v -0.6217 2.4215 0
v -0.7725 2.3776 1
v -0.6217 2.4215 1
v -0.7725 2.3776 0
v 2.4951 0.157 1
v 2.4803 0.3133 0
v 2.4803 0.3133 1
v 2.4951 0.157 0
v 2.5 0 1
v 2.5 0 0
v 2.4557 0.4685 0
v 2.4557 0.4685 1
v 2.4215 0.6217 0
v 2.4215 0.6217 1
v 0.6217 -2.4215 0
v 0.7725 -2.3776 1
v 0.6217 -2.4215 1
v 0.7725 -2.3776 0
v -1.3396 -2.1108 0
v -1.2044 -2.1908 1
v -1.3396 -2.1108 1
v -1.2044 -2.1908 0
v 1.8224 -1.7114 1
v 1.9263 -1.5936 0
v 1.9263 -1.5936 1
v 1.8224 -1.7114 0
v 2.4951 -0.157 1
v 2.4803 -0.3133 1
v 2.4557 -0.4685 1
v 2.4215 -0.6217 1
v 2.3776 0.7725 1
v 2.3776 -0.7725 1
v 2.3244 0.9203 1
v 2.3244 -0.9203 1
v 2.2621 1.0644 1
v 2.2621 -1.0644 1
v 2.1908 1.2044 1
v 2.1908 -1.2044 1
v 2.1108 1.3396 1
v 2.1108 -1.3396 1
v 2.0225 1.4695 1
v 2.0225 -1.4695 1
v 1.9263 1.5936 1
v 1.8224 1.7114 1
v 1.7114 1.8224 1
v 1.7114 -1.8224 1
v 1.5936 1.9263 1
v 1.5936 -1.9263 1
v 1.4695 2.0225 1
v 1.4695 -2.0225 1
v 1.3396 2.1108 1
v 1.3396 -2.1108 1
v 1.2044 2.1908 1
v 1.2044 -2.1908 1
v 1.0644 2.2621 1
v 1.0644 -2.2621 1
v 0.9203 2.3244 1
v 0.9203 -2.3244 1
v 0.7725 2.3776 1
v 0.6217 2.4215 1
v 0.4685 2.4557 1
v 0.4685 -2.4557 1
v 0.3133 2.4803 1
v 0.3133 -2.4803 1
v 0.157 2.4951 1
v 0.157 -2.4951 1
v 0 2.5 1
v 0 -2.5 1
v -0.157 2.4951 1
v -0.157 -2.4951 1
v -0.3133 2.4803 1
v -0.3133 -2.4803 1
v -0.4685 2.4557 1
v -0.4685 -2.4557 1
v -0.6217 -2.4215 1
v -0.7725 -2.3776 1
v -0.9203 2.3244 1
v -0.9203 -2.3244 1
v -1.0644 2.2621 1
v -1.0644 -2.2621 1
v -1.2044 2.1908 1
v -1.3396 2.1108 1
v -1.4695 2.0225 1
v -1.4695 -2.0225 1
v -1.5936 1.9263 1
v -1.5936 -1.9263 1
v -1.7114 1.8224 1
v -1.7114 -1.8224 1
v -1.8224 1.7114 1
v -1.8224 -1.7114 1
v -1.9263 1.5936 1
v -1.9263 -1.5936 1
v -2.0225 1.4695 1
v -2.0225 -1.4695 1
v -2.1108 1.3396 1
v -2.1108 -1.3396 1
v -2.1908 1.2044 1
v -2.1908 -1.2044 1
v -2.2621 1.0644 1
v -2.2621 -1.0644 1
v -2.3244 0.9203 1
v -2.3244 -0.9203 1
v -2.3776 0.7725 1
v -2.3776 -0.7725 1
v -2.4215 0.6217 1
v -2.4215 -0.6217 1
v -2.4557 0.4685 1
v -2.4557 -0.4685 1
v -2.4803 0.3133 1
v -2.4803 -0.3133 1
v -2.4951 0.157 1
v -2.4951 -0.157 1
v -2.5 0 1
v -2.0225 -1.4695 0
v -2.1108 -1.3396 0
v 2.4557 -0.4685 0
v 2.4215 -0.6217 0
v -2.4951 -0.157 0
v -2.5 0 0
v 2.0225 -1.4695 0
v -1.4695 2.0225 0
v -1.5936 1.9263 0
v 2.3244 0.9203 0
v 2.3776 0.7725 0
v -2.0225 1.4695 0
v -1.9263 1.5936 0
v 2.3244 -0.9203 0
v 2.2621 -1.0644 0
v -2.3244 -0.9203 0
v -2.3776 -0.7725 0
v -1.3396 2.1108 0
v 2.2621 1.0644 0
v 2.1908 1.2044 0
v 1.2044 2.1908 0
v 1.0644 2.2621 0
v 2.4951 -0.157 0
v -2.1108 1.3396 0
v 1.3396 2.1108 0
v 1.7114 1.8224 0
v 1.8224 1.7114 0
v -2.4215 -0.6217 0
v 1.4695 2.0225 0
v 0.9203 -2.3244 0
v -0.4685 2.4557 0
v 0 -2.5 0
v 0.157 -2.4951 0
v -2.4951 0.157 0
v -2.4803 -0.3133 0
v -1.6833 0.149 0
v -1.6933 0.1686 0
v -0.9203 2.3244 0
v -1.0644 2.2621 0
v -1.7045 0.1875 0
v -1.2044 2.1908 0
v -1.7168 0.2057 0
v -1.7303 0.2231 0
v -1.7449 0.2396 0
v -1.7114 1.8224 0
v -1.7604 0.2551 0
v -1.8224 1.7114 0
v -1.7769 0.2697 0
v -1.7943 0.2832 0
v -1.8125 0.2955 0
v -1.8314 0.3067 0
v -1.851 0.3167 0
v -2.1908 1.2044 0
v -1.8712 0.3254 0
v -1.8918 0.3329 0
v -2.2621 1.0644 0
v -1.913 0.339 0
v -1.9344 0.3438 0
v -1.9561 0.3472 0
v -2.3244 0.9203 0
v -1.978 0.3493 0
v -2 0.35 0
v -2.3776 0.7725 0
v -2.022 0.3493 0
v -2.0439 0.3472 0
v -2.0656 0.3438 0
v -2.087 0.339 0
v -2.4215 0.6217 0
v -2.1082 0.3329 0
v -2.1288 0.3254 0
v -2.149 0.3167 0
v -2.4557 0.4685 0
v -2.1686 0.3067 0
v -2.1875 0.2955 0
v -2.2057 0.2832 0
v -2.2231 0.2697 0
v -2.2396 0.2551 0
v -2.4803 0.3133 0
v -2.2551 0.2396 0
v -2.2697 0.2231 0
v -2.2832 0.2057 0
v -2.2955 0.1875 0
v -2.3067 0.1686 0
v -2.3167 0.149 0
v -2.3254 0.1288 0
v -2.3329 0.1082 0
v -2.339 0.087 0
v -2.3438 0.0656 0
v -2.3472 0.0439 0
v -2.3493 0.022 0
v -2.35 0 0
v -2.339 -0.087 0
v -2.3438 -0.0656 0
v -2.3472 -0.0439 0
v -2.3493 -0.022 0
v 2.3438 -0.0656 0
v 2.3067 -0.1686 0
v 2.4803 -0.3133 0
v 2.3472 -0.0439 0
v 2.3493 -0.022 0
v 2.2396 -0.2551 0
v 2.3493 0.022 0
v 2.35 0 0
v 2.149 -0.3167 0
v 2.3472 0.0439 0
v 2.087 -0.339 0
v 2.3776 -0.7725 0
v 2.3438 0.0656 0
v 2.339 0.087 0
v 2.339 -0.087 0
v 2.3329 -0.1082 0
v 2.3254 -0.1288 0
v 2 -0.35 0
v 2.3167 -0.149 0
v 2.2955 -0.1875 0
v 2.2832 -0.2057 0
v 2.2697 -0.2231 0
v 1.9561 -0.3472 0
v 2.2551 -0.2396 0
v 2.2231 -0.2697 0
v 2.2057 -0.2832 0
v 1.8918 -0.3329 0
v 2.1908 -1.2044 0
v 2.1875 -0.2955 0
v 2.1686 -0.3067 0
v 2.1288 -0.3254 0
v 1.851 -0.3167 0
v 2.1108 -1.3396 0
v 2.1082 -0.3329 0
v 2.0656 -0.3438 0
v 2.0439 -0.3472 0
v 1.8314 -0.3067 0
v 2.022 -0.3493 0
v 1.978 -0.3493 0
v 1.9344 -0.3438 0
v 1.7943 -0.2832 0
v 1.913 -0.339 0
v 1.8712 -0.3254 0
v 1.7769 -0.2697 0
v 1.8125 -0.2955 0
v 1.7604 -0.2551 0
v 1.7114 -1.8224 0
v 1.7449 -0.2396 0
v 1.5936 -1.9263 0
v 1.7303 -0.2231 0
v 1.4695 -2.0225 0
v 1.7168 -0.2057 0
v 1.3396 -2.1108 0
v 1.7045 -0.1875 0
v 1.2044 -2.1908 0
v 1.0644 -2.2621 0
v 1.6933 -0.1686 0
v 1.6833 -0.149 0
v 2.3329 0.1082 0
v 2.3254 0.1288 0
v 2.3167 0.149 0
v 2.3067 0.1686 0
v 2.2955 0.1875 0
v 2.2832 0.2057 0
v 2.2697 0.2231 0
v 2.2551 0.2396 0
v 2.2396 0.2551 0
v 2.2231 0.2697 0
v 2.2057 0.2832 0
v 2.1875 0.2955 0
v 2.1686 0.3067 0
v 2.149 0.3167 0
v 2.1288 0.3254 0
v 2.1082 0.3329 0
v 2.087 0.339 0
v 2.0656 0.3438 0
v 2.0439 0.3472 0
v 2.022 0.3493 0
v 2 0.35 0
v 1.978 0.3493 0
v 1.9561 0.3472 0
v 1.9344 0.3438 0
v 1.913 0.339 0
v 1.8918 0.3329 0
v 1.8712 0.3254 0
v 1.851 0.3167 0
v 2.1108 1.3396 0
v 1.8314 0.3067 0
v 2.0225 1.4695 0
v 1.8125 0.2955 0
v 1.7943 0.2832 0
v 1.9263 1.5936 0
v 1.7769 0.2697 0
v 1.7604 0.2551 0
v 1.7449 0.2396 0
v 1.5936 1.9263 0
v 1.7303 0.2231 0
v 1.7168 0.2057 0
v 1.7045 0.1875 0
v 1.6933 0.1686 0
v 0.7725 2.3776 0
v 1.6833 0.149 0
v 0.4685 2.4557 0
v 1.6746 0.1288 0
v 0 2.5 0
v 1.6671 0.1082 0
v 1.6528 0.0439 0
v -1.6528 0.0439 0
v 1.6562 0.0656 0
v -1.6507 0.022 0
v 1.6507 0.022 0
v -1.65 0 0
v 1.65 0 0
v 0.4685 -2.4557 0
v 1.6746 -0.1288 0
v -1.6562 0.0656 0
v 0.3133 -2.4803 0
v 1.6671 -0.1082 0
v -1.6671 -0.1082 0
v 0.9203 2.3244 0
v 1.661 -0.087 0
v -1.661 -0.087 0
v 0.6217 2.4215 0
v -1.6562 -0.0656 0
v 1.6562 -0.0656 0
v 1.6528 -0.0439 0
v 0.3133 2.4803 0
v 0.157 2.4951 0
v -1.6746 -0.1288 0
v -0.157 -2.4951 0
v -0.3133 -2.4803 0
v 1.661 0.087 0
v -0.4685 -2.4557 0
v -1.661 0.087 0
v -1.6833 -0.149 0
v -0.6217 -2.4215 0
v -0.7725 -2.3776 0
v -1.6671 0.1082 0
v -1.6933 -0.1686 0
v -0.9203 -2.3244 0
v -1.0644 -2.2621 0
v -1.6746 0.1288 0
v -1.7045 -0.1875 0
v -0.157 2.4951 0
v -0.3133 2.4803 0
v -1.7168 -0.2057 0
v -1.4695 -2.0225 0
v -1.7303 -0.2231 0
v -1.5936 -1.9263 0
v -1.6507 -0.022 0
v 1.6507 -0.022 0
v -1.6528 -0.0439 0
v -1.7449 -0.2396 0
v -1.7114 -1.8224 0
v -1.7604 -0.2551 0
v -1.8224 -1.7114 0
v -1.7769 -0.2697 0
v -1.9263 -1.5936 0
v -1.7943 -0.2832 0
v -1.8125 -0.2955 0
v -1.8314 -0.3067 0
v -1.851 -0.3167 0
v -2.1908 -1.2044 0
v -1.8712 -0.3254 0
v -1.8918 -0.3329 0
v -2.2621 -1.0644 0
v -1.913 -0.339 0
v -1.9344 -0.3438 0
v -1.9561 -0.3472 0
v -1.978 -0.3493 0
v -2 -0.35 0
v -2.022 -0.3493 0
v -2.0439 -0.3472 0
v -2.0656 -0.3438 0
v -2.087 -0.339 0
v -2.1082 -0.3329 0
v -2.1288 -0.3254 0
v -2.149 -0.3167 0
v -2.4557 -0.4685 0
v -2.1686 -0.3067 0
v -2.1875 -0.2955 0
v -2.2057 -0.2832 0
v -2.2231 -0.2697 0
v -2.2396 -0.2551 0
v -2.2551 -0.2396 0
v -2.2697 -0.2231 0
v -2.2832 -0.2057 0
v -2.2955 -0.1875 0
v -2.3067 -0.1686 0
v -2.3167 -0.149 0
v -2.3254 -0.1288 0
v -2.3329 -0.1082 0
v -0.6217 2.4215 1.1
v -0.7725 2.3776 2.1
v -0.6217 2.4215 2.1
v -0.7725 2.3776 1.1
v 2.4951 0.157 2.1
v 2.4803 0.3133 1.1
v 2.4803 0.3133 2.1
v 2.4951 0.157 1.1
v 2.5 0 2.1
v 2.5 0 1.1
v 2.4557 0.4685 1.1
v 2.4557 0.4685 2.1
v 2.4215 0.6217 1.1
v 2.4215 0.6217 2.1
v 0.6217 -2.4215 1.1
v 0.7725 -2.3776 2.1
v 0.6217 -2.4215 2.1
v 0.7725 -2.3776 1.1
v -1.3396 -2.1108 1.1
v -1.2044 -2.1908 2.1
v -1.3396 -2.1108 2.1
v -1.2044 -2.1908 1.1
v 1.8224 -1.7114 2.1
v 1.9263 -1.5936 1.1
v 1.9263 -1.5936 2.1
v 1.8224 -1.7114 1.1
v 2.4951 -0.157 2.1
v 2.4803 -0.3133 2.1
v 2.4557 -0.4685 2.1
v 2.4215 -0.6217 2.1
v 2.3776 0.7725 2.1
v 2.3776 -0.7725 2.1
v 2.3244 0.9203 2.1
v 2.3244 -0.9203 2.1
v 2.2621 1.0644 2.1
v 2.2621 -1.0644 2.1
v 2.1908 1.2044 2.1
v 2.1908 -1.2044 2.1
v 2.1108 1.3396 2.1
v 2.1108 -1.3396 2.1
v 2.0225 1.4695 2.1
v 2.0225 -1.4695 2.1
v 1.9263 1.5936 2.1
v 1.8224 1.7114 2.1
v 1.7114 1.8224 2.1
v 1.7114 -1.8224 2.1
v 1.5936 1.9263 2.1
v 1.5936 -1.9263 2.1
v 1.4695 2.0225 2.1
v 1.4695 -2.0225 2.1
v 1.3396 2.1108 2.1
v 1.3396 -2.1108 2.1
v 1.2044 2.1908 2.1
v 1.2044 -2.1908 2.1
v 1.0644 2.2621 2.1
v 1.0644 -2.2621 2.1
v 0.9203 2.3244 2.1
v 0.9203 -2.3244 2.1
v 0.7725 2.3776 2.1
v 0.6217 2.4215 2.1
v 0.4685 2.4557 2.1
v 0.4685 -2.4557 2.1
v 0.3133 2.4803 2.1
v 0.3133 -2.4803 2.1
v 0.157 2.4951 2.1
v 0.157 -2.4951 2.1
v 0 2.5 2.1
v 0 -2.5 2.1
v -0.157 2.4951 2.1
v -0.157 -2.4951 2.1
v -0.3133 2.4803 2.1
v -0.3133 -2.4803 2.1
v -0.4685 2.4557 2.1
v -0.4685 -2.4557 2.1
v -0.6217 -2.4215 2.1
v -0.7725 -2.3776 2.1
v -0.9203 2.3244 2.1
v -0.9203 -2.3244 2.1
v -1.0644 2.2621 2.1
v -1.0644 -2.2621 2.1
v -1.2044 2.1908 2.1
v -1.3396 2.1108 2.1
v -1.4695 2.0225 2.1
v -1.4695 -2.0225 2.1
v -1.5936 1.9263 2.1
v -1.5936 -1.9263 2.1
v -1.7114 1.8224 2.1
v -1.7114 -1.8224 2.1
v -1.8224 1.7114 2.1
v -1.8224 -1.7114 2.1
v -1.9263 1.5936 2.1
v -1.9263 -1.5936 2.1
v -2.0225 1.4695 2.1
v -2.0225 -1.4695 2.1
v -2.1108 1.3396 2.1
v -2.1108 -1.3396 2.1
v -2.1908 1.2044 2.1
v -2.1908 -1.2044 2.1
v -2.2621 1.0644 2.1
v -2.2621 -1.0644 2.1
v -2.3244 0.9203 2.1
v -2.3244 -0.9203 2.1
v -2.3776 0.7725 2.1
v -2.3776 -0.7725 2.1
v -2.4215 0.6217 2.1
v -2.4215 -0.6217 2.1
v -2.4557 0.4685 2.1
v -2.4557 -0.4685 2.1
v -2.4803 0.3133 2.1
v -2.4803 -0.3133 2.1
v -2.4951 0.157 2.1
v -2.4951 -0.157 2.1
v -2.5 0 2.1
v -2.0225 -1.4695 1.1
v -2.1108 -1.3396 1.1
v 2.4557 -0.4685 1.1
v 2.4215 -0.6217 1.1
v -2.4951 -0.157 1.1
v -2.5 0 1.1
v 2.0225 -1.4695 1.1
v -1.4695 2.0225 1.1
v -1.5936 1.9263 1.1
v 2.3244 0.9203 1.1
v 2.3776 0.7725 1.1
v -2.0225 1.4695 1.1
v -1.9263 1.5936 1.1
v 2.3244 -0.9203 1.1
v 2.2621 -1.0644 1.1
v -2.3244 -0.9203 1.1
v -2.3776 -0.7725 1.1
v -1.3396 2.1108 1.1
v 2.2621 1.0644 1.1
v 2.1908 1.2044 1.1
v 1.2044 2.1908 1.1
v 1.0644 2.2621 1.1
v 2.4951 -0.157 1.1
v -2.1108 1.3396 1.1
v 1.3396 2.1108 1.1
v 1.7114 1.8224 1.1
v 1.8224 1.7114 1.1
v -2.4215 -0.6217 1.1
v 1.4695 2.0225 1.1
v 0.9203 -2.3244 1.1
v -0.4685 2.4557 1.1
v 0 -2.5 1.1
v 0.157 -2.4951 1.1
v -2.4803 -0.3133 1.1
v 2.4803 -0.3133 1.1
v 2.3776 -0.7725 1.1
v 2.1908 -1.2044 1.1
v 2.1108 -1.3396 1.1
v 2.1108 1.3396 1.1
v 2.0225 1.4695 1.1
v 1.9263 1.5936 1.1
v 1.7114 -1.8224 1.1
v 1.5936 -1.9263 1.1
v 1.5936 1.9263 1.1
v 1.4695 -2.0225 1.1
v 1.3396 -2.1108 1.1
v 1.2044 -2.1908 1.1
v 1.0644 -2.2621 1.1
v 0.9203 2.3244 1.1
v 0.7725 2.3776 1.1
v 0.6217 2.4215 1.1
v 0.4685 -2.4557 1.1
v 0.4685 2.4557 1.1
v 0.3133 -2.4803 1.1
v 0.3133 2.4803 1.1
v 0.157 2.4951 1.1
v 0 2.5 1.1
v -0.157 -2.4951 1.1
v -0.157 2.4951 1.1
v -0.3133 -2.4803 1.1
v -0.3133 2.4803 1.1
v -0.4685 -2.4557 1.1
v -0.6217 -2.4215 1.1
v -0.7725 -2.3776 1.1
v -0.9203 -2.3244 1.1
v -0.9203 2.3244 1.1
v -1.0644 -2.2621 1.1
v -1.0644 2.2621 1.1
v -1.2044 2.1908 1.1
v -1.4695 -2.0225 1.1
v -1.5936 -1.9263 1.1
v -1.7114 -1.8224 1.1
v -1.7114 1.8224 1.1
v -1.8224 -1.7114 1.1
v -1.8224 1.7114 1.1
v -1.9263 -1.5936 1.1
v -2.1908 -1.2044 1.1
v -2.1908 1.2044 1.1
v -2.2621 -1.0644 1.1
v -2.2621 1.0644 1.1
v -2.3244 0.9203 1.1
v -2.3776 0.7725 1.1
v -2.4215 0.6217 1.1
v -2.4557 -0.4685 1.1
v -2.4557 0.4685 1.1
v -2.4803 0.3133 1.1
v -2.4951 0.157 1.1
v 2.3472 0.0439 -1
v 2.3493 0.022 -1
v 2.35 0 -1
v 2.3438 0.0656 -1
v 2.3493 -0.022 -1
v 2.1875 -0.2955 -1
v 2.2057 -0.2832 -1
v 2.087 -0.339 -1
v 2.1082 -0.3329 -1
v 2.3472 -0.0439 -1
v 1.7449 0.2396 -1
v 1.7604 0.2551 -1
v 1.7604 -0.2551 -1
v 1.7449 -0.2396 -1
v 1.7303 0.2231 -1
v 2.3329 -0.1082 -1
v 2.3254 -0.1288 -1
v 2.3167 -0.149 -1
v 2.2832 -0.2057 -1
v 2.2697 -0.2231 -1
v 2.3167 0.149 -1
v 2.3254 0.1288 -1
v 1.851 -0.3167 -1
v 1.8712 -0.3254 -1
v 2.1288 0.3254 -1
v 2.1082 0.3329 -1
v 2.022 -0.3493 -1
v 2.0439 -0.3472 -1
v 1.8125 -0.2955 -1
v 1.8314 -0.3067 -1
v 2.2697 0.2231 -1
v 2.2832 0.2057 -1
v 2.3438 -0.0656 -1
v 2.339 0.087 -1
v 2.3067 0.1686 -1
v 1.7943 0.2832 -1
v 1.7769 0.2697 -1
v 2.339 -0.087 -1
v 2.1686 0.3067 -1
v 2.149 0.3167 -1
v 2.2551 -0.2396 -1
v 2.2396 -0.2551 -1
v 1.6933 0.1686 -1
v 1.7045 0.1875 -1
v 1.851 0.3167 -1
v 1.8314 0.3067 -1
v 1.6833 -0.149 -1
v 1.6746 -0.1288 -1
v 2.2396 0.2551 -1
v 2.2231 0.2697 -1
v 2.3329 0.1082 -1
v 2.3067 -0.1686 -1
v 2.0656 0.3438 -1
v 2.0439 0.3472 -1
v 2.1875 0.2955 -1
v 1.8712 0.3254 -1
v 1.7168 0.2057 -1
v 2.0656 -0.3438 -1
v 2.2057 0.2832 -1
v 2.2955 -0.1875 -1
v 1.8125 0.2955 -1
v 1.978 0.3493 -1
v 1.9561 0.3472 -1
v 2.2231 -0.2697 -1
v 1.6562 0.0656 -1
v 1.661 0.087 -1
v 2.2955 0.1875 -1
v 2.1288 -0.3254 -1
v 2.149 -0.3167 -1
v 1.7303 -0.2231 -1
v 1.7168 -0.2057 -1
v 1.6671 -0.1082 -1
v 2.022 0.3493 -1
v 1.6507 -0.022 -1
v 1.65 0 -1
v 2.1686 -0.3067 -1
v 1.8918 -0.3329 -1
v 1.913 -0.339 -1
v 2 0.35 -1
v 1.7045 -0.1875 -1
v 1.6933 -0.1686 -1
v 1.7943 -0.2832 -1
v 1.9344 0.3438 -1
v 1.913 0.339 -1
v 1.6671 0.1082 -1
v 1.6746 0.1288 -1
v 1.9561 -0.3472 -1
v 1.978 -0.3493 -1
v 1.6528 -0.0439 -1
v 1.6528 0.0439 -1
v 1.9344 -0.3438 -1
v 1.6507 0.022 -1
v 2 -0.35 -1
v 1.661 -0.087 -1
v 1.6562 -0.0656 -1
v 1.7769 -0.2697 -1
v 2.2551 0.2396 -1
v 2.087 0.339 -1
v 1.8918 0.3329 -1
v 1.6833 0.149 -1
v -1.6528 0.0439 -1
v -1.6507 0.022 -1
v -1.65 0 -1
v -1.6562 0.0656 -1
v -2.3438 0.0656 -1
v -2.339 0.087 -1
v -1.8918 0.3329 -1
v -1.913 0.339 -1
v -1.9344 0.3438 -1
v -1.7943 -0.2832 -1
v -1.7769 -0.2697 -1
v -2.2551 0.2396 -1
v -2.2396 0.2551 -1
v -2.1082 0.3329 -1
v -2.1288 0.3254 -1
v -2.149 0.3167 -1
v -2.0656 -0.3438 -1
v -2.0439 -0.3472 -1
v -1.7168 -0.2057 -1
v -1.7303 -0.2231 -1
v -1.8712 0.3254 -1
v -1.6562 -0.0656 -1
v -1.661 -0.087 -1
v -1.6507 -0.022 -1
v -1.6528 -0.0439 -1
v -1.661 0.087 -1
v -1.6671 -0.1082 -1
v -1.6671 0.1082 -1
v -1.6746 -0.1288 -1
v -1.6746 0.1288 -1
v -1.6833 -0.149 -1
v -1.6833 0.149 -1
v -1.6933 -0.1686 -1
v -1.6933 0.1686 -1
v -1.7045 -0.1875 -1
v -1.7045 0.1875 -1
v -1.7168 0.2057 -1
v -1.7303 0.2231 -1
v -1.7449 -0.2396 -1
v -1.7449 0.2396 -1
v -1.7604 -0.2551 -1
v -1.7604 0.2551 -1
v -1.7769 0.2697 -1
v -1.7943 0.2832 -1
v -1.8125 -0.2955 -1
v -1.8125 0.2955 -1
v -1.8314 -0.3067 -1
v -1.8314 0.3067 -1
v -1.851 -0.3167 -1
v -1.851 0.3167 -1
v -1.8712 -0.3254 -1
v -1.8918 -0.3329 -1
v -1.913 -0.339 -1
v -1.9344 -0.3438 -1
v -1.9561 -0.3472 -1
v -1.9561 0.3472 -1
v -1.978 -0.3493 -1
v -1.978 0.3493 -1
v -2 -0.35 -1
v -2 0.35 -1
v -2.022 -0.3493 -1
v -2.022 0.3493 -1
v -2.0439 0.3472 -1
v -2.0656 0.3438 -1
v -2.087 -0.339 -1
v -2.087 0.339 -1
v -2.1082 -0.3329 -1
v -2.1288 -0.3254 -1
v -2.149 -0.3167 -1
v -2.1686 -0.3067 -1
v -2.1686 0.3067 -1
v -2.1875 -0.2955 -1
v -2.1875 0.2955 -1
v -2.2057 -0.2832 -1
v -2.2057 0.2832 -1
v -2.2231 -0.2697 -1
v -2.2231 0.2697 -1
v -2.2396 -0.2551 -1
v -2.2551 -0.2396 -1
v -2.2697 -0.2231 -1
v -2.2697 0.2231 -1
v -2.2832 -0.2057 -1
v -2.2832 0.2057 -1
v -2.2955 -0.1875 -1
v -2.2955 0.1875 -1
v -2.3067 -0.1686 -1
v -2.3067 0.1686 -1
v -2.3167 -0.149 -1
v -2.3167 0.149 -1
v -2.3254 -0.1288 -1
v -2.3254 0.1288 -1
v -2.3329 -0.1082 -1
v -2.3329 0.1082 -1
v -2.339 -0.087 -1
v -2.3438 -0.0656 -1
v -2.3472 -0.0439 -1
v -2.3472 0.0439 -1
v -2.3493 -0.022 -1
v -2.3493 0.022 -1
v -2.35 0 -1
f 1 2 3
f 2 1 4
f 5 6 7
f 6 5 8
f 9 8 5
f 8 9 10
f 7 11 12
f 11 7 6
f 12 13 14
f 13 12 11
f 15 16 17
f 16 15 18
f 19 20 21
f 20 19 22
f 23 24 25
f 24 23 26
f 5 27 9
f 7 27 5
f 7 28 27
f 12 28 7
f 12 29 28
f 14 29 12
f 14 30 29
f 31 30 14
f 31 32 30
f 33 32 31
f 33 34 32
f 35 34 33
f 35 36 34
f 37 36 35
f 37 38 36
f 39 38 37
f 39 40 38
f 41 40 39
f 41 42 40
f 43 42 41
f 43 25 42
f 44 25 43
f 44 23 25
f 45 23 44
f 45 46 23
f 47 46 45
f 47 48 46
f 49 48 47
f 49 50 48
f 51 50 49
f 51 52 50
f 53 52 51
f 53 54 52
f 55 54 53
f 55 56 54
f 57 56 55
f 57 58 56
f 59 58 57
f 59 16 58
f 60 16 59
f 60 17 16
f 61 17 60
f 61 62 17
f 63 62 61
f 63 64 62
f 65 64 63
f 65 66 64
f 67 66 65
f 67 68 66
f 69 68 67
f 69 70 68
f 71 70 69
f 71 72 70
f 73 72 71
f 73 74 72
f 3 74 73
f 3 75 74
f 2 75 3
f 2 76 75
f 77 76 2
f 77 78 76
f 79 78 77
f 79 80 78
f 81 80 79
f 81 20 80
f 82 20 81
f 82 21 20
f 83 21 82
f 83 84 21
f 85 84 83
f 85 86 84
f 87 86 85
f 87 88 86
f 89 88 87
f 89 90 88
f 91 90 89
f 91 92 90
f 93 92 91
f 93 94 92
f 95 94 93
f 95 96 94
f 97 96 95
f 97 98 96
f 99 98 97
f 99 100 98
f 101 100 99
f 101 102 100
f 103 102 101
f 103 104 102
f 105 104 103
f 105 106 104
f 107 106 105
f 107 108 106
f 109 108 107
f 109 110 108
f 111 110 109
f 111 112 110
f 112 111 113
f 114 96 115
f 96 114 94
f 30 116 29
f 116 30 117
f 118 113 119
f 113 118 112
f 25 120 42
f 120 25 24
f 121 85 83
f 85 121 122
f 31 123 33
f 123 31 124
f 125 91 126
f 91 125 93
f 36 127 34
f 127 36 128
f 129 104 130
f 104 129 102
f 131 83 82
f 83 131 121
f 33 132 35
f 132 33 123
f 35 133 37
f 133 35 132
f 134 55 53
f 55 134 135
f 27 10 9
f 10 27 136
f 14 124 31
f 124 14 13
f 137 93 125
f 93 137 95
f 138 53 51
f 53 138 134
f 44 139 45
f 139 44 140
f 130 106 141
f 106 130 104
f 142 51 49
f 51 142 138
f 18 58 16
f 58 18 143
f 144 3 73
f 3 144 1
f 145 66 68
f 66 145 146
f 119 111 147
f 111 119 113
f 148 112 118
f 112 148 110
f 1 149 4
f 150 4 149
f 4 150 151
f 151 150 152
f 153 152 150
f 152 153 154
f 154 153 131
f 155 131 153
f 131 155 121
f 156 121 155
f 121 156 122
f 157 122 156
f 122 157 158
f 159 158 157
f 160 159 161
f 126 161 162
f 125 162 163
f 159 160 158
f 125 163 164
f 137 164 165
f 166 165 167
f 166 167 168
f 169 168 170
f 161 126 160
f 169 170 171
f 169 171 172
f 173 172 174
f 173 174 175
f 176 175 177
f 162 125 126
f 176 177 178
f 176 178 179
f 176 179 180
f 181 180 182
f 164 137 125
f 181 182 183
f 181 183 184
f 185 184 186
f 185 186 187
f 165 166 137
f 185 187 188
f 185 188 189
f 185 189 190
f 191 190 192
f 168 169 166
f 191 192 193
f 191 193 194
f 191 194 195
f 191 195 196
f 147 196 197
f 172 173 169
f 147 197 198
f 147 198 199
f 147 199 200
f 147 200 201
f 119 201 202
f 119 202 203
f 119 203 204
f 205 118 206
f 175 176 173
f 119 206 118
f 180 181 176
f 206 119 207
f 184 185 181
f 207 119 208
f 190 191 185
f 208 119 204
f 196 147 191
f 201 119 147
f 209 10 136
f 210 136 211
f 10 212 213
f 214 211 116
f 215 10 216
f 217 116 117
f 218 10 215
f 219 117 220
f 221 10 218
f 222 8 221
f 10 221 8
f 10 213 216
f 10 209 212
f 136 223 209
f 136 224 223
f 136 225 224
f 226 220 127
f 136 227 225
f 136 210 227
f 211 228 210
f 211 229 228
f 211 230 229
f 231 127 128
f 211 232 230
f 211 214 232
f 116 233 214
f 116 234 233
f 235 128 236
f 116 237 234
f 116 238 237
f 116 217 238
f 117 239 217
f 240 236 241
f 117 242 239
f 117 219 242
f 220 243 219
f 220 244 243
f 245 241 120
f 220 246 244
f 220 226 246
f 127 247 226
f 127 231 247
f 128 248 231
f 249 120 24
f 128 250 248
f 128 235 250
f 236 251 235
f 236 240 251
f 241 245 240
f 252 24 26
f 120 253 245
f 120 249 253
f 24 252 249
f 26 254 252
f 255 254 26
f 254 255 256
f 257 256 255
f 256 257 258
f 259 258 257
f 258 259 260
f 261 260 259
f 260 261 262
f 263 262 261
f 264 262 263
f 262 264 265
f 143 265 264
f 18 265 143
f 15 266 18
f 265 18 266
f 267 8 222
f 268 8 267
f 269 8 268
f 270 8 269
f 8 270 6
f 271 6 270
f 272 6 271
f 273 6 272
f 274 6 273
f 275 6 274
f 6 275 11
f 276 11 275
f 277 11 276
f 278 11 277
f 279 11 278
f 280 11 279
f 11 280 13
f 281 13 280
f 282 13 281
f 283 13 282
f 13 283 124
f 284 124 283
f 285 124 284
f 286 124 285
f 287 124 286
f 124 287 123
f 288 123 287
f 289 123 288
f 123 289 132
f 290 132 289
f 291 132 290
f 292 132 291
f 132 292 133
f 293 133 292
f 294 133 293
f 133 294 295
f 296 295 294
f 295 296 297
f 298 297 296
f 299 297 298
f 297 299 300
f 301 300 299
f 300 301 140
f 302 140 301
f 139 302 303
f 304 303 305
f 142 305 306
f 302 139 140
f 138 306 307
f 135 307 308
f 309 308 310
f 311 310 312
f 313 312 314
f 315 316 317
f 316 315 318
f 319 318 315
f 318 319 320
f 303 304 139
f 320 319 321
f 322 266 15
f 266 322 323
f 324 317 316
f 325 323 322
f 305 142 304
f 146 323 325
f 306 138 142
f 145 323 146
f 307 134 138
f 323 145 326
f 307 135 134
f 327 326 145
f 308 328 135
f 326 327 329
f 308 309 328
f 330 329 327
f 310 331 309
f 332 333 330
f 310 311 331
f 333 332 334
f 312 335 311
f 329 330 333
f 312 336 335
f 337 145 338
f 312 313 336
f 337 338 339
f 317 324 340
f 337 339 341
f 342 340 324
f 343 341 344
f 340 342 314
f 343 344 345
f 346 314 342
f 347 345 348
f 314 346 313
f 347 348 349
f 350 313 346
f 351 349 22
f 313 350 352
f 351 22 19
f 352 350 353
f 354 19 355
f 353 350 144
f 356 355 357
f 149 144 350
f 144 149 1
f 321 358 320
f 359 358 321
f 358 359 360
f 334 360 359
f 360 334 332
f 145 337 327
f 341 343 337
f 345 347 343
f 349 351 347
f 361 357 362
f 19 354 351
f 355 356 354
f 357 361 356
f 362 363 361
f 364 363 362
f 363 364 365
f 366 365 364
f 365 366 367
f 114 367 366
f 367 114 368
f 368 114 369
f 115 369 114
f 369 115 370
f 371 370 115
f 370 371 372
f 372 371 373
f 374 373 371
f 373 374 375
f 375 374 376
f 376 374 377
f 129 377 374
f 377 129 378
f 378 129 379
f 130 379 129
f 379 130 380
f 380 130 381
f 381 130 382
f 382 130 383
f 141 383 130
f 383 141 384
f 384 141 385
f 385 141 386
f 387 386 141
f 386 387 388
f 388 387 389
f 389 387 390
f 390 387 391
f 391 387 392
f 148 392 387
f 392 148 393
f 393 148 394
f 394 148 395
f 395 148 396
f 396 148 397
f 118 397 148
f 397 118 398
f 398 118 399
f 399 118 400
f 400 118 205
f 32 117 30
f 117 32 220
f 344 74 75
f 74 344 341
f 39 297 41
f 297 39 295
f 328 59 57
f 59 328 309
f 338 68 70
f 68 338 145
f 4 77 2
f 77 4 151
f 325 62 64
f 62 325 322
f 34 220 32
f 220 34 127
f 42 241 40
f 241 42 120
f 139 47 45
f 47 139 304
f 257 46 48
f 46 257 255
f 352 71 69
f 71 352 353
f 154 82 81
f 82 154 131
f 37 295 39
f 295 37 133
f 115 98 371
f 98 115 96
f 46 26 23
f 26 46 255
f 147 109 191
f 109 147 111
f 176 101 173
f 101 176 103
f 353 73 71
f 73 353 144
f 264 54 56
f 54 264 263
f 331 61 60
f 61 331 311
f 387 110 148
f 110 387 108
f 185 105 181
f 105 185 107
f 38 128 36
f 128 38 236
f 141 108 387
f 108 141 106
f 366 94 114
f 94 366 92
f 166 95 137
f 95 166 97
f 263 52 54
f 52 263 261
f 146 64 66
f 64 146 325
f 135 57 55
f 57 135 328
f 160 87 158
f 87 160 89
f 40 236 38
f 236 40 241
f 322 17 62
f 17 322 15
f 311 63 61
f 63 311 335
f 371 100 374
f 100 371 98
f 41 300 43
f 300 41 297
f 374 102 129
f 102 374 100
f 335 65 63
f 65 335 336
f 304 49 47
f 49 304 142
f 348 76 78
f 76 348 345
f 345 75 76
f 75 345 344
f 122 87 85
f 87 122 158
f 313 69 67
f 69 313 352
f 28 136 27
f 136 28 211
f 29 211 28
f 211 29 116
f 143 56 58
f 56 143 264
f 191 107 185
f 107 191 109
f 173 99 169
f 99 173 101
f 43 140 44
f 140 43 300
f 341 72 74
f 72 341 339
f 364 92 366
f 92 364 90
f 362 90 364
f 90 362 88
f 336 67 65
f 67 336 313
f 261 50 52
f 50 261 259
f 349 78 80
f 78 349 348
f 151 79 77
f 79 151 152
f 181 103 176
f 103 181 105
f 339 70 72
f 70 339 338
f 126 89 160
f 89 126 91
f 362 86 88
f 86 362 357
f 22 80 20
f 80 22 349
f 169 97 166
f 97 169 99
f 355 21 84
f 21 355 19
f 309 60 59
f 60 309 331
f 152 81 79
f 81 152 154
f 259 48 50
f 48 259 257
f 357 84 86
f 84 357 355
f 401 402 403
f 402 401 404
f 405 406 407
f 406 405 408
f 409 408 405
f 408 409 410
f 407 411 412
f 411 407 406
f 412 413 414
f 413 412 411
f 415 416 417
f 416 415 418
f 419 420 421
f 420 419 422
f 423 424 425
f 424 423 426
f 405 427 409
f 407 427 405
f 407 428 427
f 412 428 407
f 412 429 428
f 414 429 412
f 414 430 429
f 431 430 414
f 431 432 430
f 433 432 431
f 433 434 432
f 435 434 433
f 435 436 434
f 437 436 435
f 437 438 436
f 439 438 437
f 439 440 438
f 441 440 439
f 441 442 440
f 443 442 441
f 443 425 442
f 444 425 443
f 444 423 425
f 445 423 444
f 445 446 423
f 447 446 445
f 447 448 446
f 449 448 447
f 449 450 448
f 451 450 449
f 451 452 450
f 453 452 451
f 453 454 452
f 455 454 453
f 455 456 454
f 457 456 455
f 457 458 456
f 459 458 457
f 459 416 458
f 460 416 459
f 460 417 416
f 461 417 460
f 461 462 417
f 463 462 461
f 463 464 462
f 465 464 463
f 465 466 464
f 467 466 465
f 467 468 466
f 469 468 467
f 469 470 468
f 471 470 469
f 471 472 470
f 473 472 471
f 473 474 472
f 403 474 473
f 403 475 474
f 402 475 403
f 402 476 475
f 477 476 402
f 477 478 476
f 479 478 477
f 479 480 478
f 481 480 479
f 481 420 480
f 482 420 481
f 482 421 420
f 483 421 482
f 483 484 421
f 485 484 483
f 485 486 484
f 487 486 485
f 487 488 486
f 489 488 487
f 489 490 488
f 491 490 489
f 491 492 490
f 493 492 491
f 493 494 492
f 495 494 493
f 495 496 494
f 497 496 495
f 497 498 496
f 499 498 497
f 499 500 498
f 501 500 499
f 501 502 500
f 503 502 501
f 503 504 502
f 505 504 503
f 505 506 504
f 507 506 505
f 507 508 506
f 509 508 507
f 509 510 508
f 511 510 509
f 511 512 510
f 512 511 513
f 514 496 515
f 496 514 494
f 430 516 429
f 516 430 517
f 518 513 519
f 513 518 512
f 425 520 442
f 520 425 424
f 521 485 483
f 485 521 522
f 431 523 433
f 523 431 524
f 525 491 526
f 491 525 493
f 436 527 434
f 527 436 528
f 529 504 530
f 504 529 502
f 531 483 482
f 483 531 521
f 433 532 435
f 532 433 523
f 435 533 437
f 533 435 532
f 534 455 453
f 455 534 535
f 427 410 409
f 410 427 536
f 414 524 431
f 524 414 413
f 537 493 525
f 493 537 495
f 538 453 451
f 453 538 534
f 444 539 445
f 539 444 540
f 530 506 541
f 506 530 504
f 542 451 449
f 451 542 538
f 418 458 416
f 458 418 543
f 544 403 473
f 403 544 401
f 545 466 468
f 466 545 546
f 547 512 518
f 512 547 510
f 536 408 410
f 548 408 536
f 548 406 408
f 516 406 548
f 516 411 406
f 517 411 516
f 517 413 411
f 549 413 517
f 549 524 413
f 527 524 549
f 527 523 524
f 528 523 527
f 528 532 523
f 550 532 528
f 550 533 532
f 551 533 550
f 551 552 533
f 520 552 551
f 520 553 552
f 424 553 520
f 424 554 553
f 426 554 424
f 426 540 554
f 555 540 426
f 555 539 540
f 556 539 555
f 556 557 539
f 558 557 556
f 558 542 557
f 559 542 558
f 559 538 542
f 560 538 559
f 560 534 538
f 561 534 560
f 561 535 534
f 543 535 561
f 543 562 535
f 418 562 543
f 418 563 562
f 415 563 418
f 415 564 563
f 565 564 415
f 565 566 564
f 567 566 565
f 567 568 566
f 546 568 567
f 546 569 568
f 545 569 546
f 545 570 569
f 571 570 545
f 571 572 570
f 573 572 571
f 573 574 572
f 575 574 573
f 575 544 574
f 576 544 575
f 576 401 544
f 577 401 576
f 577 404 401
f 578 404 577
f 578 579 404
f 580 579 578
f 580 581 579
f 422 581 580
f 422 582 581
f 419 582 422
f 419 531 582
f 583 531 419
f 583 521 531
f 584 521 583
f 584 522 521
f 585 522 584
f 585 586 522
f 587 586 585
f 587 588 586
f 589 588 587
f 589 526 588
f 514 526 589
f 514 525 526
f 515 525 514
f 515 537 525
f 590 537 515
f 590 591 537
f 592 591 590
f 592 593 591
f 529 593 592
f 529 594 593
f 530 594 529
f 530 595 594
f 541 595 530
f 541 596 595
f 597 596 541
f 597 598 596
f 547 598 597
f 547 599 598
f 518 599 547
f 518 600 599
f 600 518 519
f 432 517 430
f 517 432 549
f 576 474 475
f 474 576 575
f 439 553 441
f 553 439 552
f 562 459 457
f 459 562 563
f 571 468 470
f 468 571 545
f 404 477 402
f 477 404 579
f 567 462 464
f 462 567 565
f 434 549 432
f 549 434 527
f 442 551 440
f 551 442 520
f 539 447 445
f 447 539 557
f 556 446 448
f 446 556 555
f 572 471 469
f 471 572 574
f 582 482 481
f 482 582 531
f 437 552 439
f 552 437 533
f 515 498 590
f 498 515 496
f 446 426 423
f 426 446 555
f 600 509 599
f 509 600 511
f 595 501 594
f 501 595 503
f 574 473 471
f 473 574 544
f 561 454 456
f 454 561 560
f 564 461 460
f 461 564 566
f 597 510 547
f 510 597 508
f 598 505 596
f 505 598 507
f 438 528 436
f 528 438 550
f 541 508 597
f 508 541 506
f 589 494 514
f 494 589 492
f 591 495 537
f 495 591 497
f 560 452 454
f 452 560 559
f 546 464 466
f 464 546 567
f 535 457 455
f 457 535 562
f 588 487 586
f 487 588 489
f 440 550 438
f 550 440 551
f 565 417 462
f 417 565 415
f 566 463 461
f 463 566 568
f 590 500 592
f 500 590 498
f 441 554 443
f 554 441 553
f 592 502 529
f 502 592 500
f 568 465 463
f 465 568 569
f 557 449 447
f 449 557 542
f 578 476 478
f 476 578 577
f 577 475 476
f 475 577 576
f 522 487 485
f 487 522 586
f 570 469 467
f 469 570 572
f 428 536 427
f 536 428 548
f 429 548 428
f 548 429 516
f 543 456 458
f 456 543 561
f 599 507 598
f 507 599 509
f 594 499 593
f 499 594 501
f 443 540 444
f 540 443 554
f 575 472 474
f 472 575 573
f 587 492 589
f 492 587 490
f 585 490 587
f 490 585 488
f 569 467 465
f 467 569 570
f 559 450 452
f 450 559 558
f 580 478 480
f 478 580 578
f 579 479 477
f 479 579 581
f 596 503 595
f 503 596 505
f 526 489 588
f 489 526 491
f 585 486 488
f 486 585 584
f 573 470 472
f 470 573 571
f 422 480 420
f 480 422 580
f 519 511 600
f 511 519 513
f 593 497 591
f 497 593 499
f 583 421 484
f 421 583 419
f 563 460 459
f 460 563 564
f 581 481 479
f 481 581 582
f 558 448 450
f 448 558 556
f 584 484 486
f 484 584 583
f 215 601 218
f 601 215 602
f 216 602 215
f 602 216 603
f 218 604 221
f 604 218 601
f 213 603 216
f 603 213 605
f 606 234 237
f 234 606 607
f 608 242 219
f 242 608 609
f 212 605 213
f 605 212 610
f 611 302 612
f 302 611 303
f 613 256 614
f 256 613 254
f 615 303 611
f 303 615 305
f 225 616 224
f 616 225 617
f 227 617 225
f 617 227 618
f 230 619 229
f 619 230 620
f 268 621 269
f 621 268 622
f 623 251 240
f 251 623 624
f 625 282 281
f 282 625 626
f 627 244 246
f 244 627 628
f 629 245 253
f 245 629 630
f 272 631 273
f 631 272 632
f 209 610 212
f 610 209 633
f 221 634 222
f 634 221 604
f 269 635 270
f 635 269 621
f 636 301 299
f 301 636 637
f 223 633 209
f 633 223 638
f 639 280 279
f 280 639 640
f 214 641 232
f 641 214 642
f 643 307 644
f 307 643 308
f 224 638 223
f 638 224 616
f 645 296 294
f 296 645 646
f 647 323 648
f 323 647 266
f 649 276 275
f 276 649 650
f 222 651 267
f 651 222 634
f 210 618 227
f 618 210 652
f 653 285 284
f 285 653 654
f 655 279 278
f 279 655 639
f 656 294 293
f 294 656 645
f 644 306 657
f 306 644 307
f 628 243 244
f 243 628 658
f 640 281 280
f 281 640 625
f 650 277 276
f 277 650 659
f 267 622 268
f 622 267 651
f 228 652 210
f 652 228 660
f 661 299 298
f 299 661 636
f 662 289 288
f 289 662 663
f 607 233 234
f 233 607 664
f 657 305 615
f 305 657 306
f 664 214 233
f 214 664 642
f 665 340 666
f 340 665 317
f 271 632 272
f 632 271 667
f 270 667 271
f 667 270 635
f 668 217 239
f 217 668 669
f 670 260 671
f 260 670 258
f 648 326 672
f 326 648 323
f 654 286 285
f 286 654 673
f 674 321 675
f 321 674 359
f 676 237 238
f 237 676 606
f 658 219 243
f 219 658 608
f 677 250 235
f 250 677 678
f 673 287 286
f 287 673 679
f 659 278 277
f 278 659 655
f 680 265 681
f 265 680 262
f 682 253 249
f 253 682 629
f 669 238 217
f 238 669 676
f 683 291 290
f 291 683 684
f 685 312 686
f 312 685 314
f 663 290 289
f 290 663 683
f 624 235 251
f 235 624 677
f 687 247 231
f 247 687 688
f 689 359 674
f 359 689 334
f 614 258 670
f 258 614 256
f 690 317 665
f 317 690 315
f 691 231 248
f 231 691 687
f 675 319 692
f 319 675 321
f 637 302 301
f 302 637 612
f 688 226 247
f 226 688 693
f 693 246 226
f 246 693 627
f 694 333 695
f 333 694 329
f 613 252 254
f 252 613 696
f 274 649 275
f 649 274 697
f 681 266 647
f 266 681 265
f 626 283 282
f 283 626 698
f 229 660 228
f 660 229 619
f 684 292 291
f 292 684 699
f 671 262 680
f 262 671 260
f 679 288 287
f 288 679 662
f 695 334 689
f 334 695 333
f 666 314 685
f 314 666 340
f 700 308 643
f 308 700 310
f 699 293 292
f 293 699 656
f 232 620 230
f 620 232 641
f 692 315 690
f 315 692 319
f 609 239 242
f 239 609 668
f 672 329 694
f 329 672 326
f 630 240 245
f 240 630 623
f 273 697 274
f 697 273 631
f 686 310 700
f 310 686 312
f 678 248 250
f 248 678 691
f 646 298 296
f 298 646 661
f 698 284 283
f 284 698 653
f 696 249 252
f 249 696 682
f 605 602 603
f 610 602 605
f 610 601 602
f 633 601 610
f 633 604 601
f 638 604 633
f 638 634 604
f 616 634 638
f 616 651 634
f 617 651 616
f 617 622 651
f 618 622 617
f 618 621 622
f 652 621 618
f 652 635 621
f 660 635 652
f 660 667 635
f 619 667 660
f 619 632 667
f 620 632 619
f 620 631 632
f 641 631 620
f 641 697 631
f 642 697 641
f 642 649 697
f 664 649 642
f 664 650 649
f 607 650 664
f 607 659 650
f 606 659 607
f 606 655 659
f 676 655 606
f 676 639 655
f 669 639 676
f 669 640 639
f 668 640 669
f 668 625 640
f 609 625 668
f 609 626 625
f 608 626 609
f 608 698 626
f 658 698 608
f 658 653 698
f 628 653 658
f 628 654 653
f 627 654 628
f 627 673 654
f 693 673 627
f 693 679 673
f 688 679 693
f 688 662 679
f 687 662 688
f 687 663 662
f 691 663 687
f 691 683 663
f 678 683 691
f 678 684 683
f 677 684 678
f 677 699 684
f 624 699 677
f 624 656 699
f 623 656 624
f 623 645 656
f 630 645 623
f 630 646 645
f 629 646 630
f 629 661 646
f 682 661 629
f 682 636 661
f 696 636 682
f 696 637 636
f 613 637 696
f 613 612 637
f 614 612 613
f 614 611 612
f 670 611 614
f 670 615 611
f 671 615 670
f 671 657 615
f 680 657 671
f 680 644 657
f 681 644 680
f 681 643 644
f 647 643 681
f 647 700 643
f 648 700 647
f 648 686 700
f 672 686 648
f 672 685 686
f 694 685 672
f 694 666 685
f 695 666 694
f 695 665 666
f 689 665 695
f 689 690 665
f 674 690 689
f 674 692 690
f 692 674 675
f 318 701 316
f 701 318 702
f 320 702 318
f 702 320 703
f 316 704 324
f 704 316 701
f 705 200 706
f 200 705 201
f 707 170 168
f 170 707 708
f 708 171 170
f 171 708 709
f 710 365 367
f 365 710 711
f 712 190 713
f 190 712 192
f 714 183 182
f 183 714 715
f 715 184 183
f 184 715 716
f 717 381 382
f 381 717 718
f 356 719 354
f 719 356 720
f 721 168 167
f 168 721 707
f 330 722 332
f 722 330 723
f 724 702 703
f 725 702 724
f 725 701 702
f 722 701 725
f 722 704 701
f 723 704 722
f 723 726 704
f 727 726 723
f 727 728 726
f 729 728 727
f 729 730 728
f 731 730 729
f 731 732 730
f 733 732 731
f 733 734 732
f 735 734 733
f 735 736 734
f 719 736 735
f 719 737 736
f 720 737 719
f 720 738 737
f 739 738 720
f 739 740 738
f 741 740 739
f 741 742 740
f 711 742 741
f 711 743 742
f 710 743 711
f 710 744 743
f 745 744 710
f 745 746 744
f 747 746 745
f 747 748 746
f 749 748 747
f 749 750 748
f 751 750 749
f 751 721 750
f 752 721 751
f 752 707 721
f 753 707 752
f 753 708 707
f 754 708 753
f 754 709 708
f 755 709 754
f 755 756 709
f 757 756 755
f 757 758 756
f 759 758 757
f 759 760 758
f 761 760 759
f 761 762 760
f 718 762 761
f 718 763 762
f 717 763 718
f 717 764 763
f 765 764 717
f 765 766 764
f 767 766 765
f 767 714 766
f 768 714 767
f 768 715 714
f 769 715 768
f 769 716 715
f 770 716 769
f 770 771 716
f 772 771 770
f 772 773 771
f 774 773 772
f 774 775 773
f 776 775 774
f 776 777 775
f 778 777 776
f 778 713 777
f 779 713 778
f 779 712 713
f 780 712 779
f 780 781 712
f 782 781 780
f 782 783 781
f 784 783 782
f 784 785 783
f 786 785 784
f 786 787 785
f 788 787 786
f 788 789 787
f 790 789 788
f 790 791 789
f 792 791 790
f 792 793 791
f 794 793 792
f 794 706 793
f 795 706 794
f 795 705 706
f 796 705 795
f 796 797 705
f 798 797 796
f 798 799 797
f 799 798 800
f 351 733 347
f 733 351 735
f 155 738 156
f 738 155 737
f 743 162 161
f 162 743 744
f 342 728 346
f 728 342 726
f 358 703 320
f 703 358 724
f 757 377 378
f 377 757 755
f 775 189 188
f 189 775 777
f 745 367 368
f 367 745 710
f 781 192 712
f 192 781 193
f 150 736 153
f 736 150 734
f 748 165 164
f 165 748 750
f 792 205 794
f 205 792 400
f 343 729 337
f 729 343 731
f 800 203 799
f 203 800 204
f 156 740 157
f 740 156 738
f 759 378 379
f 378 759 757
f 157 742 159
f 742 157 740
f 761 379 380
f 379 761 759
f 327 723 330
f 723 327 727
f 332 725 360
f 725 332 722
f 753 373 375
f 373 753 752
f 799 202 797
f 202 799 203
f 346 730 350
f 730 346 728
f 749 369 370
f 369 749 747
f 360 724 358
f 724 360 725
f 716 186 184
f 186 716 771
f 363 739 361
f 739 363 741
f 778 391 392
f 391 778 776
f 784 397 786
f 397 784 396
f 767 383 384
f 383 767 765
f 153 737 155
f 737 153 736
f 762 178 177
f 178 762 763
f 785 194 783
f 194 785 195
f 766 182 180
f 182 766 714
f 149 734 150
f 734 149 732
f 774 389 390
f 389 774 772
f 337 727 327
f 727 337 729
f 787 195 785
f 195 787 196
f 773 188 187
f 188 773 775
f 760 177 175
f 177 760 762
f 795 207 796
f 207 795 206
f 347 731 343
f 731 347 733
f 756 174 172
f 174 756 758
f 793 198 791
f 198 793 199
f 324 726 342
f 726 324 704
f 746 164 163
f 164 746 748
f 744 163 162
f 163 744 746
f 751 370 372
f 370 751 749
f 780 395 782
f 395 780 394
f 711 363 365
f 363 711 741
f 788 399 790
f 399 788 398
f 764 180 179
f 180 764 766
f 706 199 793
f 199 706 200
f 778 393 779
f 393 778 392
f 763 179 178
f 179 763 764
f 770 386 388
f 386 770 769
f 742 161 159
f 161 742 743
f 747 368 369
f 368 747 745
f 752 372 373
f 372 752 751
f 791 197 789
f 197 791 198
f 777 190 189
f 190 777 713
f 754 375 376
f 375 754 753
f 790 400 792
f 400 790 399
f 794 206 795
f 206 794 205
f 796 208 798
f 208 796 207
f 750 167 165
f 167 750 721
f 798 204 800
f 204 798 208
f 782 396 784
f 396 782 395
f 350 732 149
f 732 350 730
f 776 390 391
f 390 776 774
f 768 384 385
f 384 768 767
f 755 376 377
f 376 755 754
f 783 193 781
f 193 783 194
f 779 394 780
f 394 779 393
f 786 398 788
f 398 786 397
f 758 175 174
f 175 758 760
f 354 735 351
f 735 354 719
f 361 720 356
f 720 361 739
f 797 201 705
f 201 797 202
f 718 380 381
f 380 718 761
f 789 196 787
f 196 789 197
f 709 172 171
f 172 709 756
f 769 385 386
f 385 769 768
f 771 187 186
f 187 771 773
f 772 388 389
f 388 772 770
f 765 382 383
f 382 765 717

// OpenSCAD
/* 
	Supplemental Valve 4

*/

$fn = 100; // increase the smoothness of the cylinders

// Define the dimensions
chamber_diameter = 5; // Diameter of both chambers
membrane_thickness = 0.1; // 100 microns
chamber_height = 1; // Height of each chamber
port_diameter = 0.7; // Diameter of the ports
port_height = 2; // Height of the ports

// Draw the fluid chamber
cylinder(h=chamber_height, d=chamber_diameter);

// Draw the pneumatic chamber with membrane
translate([0, 0, chamber_height + membrane_thickness])
    cylinder(h=chamber_height, d=chamber_diameter);

// Draw the two offset ports
translate([port_height, 0, -chamber_height])
    cylinder(h=port_height, d=port_diameter);

translate([-port_height, 0, -chamber_height])
    cylinder(h=port_height, d=port_diameter);
